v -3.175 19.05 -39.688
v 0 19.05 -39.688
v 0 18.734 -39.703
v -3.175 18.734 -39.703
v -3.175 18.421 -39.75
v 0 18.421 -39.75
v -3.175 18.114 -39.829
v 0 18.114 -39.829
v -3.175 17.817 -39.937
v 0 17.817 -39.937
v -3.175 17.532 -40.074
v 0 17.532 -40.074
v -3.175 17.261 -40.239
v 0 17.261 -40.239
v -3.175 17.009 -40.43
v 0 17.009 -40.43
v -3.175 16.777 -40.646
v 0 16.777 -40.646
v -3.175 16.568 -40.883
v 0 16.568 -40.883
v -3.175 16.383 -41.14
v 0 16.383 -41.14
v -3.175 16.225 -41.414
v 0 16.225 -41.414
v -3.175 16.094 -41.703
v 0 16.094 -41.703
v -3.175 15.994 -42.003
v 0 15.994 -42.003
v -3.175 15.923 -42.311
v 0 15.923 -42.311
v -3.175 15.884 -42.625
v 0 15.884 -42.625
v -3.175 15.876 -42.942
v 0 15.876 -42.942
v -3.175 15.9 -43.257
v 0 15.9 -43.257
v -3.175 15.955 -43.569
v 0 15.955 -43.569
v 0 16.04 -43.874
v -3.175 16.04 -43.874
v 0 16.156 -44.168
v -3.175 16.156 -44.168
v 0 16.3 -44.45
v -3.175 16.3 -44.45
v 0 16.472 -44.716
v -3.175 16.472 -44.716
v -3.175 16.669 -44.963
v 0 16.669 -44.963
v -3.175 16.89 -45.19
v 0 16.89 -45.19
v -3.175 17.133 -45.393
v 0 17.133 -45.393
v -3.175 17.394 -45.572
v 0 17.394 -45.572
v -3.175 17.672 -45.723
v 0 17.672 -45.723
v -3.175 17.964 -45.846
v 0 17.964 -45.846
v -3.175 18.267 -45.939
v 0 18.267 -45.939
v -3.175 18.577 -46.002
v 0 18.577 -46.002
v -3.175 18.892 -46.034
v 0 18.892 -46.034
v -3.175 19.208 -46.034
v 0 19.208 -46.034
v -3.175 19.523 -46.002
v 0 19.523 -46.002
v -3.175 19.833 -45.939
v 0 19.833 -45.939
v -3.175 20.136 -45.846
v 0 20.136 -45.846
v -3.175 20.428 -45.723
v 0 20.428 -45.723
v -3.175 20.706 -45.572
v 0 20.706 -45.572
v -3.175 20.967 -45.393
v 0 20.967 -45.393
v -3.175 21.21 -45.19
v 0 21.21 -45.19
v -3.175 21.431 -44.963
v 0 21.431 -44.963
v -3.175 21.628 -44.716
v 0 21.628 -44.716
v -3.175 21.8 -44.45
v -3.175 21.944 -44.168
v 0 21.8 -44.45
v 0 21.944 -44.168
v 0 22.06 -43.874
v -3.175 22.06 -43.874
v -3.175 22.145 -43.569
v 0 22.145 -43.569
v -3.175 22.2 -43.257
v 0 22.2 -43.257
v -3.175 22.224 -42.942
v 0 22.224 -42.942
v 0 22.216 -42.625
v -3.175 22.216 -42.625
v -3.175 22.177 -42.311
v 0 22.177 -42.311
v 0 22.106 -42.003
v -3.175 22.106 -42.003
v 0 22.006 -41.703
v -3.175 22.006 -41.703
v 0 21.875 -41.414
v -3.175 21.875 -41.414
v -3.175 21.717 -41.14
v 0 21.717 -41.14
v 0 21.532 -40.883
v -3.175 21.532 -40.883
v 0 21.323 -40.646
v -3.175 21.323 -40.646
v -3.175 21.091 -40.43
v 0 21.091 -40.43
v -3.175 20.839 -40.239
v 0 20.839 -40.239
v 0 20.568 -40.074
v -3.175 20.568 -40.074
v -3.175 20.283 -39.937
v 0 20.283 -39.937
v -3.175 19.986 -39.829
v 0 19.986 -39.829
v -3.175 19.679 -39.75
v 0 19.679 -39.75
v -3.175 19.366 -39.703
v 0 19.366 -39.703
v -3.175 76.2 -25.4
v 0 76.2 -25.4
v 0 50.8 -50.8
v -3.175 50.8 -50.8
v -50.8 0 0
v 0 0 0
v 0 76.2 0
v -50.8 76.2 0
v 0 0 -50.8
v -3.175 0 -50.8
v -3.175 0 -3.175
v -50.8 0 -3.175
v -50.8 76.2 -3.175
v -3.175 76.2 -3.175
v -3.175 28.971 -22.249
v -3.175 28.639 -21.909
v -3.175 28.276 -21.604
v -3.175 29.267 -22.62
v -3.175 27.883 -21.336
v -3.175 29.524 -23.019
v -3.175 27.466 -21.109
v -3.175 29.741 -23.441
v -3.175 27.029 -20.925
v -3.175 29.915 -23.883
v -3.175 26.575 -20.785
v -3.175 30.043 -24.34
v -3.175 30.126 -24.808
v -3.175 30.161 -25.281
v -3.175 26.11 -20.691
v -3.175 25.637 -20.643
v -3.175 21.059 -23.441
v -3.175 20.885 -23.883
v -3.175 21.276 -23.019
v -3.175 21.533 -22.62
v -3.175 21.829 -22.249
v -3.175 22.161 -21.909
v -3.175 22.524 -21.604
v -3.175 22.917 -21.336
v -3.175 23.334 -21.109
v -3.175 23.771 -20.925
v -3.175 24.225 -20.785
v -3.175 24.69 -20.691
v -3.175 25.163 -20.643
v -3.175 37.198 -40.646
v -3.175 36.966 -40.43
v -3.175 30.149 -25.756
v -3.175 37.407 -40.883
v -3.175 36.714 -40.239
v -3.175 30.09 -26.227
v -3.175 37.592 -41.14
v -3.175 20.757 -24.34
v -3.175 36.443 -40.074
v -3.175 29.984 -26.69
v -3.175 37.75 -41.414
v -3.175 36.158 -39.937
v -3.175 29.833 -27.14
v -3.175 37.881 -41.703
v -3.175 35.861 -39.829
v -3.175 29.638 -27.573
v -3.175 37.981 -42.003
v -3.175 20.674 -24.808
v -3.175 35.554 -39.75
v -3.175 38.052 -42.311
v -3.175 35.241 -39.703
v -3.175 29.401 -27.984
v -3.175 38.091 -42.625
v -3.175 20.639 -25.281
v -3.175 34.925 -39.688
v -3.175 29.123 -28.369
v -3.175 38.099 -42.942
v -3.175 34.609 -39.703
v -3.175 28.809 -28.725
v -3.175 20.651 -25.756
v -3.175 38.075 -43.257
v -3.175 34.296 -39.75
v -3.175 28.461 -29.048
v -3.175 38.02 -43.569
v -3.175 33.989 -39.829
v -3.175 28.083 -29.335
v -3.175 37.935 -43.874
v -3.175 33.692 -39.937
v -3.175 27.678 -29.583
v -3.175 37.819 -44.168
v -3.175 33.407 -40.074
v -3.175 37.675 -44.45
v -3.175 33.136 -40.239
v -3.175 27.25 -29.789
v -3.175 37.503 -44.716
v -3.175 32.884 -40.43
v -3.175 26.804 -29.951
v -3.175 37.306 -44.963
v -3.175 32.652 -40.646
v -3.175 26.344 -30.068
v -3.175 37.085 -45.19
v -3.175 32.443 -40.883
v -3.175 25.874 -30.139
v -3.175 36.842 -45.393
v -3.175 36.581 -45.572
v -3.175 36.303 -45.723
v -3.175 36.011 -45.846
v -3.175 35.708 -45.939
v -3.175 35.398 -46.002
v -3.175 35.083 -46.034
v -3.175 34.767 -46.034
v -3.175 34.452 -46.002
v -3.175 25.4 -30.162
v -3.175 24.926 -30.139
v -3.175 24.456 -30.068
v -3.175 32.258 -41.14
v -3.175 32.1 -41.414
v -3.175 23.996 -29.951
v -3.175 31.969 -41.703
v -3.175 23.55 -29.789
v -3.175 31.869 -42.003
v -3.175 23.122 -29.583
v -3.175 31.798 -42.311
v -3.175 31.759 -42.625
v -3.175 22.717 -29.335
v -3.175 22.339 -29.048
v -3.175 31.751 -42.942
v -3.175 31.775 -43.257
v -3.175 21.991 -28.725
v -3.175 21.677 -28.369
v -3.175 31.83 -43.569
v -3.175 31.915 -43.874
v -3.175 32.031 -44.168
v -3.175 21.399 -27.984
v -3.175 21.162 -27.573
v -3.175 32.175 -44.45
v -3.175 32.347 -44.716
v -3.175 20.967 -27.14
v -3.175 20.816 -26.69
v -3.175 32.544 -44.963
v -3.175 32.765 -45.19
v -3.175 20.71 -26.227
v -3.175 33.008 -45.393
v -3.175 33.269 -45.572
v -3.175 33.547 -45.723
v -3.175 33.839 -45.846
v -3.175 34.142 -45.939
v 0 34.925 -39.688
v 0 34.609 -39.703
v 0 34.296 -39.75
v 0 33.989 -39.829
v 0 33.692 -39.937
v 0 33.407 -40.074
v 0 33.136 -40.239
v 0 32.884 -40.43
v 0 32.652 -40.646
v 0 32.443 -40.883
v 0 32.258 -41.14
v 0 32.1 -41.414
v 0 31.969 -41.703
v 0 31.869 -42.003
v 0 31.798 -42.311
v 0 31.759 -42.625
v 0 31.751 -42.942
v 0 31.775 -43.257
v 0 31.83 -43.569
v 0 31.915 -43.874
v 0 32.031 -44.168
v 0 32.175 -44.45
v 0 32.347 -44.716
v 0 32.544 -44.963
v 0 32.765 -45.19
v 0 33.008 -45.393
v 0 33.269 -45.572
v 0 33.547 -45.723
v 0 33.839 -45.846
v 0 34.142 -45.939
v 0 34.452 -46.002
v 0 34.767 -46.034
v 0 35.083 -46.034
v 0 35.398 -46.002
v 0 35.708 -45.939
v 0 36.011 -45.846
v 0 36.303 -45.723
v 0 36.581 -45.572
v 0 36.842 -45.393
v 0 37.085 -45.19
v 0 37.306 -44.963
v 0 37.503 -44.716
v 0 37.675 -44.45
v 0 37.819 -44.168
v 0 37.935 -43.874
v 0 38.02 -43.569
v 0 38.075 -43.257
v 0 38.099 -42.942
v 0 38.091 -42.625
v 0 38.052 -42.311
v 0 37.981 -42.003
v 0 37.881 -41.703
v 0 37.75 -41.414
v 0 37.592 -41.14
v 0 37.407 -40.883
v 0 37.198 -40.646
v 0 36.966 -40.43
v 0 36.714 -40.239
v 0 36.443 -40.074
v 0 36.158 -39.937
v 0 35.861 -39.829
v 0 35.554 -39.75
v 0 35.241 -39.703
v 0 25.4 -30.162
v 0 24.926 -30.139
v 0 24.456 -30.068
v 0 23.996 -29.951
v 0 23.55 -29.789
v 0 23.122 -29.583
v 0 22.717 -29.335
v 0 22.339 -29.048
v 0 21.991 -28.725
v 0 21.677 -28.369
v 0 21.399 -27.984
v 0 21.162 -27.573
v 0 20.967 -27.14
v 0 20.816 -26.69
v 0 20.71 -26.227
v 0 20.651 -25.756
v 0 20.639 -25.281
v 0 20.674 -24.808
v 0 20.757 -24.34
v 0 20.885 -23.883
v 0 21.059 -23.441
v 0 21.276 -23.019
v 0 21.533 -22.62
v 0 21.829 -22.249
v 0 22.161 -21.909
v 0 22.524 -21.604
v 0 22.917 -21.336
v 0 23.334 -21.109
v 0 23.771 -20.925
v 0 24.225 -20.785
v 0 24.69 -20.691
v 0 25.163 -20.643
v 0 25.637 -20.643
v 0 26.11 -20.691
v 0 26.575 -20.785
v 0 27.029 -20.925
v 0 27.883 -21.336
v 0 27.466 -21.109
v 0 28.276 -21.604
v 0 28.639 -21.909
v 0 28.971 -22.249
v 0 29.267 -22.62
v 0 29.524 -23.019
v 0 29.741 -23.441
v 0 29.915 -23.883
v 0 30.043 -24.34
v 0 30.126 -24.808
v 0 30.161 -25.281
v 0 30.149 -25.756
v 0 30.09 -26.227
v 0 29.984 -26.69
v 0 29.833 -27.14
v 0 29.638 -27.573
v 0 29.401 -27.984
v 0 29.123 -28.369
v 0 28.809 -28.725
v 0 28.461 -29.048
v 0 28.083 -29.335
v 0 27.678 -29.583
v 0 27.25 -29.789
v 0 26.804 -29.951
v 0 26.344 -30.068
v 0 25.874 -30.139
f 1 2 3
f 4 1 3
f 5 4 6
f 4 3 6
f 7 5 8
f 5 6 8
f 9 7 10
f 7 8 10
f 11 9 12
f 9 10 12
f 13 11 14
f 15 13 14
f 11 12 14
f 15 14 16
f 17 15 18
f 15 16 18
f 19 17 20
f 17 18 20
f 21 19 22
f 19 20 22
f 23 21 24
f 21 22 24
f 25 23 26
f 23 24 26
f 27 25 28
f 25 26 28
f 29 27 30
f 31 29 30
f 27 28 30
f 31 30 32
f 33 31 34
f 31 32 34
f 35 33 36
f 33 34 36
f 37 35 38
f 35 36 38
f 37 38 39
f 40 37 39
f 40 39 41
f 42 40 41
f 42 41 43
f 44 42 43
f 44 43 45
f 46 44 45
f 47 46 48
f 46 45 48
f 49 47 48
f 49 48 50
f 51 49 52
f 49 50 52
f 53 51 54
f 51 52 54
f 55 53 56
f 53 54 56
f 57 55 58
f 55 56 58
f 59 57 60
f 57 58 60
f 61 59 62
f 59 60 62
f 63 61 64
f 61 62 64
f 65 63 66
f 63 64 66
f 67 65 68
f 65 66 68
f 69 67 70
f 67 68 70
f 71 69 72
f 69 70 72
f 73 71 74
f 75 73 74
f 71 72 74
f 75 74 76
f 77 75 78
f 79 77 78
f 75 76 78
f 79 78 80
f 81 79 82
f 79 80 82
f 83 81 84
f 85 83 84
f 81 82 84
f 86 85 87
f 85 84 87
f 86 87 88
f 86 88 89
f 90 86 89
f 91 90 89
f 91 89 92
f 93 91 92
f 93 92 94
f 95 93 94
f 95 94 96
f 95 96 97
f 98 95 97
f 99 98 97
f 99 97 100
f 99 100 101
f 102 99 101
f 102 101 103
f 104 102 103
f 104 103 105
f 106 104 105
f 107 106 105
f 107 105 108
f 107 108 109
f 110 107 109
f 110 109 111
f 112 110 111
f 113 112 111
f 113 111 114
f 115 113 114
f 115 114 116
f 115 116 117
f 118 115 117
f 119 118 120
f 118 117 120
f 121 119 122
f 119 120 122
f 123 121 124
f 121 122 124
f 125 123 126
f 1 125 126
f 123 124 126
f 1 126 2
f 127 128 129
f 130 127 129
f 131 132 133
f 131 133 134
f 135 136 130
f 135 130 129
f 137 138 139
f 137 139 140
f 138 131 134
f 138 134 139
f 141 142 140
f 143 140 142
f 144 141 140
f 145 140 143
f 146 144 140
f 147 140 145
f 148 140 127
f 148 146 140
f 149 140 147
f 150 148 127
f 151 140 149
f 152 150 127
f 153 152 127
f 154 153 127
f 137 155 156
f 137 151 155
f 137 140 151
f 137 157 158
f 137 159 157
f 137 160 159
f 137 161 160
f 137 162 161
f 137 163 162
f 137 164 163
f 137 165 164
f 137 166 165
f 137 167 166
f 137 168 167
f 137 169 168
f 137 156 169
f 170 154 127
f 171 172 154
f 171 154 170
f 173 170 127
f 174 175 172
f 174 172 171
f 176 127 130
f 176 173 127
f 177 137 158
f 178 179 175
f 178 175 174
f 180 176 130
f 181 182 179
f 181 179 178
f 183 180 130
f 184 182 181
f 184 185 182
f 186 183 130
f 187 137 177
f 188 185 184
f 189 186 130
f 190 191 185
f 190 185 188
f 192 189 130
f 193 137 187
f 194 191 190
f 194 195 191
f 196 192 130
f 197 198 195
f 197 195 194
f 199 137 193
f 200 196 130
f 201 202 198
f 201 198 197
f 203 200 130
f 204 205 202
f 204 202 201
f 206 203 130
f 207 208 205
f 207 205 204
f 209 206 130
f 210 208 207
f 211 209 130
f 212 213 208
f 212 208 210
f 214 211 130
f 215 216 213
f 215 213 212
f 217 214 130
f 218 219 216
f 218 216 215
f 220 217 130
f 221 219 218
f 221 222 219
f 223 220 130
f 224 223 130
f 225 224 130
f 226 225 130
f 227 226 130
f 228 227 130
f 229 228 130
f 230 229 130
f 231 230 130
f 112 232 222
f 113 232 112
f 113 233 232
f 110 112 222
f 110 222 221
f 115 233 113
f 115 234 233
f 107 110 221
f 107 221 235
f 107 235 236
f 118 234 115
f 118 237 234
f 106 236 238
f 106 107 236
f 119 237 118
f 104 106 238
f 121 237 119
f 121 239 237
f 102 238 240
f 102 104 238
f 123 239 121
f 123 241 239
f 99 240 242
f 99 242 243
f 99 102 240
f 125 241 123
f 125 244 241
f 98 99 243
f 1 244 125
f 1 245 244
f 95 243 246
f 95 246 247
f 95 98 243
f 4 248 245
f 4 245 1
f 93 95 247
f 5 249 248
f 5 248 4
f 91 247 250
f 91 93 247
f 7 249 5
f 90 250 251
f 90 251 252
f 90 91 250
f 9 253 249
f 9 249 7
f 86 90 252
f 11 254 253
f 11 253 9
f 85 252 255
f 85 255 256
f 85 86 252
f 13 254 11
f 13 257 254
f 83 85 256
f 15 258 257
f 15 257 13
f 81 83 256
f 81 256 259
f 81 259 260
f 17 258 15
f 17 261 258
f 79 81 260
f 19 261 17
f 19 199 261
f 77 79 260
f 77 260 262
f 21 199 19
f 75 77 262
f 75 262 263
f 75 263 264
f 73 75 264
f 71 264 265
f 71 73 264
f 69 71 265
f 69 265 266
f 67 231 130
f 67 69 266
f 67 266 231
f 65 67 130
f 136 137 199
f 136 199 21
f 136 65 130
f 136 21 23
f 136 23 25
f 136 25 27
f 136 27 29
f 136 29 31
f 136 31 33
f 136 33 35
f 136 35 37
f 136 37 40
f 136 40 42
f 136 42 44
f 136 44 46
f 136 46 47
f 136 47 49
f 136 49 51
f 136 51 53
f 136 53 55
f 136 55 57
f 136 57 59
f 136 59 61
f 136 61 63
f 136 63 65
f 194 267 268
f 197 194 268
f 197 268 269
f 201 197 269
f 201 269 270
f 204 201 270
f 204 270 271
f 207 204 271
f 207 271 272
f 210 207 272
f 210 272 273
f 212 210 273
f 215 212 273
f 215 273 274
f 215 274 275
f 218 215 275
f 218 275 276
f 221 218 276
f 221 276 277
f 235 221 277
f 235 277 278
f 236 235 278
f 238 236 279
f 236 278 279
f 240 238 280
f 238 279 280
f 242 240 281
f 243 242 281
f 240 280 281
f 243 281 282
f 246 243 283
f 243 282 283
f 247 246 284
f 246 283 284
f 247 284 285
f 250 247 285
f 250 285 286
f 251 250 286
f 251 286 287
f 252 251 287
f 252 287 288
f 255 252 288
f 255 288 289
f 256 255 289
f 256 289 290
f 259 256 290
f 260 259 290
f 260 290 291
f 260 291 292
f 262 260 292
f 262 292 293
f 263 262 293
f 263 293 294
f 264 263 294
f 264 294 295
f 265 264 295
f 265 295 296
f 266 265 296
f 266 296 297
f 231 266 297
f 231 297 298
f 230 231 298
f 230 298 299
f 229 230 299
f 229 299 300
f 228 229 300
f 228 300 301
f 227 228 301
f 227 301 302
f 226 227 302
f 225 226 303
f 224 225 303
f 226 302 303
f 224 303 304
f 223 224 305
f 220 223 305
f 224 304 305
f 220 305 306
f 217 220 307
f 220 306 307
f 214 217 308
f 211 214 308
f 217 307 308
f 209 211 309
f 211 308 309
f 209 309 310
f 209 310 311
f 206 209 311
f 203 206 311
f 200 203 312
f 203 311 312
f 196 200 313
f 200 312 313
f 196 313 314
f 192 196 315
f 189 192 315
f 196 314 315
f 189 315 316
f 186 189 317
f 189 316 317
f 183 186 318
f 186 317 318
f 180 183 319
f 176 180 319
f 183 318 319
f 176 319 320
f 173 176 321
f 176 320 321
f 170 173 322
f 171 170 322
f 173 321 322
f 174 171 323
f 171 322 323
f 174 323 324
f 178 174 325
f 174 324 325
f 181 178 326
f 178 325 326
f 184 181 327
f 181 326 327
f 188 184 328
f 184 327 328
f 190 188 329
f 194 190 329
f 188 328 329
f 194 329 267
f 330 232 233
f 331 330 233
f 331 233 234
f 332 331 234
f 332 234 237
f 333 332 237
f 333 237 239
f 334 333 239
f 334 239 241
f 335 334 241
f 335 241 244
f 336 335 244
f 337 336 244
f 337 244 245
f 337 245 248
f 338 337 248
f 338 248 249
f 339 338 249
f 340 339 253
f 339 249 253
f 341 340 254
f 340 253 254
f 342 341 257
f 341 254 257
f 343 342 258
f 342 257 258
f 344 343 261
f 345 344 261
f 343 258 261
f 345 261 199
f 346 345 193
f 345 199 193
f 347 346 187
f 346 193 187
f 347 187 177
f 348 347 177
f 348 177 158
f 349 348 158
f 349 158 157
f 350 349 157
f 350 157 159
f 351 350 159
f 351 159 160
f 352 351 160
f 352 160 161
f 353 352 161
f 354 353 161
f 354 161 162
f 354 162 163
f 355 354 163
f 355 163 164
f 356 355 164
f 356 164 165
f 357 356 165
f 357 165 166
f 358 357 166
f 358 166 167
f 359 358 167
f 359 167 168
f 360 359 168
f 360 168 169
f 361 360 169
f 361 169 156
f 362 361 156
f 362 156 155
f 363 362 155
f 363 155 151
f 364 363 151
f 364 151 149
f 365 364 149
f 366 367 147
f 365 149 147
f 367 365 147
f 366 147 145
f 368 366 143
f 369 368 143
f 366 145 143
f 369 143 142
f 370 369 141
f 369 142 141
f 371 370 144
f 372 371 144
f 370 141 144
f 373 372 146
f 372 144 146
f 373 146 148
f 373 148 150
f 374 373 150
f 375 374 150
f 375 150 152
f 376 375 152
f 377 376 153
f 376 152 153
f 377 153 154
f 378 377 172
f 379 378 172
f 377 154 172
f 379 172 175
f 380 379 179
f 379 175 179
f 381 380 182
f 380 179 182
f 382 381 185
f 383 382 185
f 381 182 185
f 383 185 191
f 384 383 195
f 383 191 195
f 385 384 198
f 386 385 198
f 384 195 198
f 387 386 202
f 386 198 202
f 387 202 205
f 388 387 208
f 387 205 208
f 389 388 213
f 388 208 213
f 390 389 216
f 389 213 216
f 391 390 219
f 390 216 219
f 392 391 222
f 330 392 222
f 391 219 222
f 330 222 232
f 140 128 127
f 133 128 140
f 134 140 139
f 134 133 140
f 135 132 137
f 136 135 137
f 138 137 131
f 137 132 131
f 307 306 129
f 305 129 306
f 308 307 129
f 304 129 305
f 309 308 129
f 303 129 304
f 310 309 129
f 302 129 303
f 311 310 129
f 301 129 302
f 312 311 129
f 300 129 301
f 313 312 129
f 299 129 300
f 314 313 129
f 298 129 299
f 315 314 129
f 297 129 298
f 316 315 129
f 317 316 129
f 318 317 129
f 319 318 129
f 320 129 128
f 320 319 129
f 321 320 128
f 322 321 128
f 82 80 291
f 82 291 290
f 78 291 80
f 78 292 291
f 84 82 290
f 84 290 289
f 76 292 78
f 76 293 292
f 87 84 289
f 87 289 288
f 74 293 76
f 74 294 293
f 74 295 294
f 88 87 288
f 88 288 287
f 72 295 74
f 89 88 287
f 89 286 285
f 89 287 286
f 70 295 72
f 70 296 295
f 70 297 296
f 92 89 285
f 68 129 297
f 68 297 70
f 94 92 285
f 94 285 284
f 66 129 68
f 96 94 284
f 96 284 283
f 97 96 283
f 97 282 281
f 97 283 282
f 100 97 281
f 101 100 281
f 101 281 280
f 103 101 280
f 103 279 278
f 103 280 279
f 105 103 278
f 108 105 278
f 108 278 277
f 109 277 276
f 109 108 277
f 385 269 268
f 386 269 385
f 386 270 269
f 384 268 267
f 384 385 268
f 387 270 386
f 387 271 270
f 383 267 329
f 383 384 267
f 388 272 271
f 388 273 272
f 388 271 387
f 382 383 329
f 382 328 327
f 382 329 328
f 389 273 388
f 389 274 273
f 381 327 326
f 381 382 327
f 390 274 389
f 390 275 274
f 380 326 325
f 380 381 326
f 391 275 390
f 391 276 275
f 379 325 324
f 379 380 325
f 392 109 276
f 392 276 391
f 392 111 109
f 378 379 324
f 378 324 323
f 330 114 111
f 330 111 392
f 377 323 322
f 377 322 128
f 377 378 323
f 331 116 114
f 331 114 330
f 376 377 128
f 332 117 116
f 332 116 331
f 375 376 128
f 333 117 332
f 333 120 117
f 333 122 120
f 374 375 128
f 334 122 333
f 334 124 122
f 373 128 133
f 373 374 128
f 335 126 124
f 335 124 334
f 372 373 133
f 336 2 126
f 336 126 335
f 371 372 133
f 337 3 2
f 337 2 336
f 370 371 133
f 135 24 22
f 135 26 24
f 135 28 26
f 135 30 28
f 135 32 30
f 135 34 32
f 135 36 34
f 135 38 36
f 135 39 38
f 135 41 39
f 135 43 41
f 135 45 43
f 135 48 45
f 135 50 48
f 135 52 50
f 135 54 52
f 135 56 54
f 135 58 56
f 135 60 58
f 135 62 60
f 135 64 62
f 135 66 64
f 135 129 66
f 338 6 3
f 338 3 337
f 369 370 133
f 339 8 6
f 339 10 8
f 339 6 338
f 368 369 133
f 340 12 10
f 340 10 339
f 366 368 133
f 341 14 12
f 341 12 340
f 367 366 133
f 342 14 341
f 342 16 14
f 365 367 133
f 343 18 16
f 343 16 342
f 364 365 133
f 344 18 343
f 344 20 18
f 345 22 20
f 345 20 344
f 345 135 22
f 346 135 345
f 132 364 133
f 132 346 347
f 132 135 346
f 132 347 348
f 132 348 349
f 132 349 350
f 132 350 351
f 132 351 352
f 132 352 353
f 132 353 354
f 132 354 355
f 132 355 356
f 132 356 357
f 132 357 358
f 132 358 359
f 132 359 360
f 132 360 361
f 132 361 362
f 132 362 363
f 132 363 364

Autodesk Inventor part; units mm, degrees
ref_plane "YZ Plane" through (0, 0, 0) normal (1, 0, 0) x (0, 1, 0)
ref_plane "XZ Plane" through (0, 0, 0) normal (0, 1, 0) x (-1, 0, 0)
ref_plane "XY Plane" through (0, 0, 0) normal (0, 0, 1) x (1, 0, 0)
sketch "Sketch1" plane through (0, 0, 0) normal (0, 1, 0) x (-1, 0, 0)
  line L0 (0, 0) -> (50.8, 0)
  line L1 (50.8, 0) -> (50.8, -3.175)
  line L2 (50.8, -3.175) -> (0, -3.175)
  line L3 (0, -3.175) -> (0, 0)
  line L4 (0, 0) -> (3.175, 0)
  line L5 (3.175, 0) -> (3.175, -50.8)
  line L6 (3.175, -50.8) -> (0, -50.8)
  line L7 (0, -50.8) -> (0, 0)
  dimension "d0" = 50.8
  dimension "d1" = 3.175
  dimension "d2" = 3.175
  dimension "d3" = 50.8
extrude "Extrusion1" add sketch "Sketch1" along normal blind 76.2
sketch "Sketch4" plane through (0, 0, 0) normal (1, 0, 0) x (0, 0, -1)
  line L0 (0, 0) -> (0, 76.2) projected
  line L1 (0, 0) -> (50.8, 0) projected
  point P0 (25.4, 25.4)
  dimension "d11" = 25.4
  dimension "d12" = 25.4
hole "Hole1" at (0, 25.4, -25.4) direction (-1, 0, 0) diameter 9.525 end through all
sketch "Sketch5" plane through (-3.175, 0, -50.8) normal (-1, 0, 0) x (0, 0, 1)
  circle A0 centre (25.4, 25.4) radius 4.7625 projected
  line L0 (0, 0) -> (0, 76.2) projected
  point P0 (50.8, 0)
  point P1 (7.9375, 19.05)
  point P2 (7.9375, 34.925)
  dimension "d20" = 9.525
  dimension "d21" = 6.35
  dimension "d23" = 7.9375
  dimension "d24" = 7.9375
hole "Hole2" at (-3.175, 19.05, -42.8625) at (-3.175, 34.925, -42.8625) direction (1, 0, 0) diameter 6.35 end through all
sketch "Sketch6" plane through (0, 0, 0) normal (1, 0, 0) x (0, 0, -1)
  line L0 (50.8, 0) -> (50.8, 76.2) projected
  line L1 (50.8, 76.2) -> (25.4, 76.2) construction
  line L2 (50.8, 76.2) -> (3.175, 76.2) construction
  line L3 (25.4, 76.2) -> (50.8, 50.8)
  line L4 (25.4, 76.2) -> (61.321, 76.2) construction
  line L5 (50.8, 50.8) -> (50.8, 76.2)
  line L6 (50.8, 76.2) -> (25.4, 76.2)
  dimension "d32" = 25.4
  dimension "d33" = 45
extrude "Extrusion4" cut sketch "Sketch6" against normal blind 76.2
properties part number "mechanical stop 2x2 angle" material "Aluminum 6061"
